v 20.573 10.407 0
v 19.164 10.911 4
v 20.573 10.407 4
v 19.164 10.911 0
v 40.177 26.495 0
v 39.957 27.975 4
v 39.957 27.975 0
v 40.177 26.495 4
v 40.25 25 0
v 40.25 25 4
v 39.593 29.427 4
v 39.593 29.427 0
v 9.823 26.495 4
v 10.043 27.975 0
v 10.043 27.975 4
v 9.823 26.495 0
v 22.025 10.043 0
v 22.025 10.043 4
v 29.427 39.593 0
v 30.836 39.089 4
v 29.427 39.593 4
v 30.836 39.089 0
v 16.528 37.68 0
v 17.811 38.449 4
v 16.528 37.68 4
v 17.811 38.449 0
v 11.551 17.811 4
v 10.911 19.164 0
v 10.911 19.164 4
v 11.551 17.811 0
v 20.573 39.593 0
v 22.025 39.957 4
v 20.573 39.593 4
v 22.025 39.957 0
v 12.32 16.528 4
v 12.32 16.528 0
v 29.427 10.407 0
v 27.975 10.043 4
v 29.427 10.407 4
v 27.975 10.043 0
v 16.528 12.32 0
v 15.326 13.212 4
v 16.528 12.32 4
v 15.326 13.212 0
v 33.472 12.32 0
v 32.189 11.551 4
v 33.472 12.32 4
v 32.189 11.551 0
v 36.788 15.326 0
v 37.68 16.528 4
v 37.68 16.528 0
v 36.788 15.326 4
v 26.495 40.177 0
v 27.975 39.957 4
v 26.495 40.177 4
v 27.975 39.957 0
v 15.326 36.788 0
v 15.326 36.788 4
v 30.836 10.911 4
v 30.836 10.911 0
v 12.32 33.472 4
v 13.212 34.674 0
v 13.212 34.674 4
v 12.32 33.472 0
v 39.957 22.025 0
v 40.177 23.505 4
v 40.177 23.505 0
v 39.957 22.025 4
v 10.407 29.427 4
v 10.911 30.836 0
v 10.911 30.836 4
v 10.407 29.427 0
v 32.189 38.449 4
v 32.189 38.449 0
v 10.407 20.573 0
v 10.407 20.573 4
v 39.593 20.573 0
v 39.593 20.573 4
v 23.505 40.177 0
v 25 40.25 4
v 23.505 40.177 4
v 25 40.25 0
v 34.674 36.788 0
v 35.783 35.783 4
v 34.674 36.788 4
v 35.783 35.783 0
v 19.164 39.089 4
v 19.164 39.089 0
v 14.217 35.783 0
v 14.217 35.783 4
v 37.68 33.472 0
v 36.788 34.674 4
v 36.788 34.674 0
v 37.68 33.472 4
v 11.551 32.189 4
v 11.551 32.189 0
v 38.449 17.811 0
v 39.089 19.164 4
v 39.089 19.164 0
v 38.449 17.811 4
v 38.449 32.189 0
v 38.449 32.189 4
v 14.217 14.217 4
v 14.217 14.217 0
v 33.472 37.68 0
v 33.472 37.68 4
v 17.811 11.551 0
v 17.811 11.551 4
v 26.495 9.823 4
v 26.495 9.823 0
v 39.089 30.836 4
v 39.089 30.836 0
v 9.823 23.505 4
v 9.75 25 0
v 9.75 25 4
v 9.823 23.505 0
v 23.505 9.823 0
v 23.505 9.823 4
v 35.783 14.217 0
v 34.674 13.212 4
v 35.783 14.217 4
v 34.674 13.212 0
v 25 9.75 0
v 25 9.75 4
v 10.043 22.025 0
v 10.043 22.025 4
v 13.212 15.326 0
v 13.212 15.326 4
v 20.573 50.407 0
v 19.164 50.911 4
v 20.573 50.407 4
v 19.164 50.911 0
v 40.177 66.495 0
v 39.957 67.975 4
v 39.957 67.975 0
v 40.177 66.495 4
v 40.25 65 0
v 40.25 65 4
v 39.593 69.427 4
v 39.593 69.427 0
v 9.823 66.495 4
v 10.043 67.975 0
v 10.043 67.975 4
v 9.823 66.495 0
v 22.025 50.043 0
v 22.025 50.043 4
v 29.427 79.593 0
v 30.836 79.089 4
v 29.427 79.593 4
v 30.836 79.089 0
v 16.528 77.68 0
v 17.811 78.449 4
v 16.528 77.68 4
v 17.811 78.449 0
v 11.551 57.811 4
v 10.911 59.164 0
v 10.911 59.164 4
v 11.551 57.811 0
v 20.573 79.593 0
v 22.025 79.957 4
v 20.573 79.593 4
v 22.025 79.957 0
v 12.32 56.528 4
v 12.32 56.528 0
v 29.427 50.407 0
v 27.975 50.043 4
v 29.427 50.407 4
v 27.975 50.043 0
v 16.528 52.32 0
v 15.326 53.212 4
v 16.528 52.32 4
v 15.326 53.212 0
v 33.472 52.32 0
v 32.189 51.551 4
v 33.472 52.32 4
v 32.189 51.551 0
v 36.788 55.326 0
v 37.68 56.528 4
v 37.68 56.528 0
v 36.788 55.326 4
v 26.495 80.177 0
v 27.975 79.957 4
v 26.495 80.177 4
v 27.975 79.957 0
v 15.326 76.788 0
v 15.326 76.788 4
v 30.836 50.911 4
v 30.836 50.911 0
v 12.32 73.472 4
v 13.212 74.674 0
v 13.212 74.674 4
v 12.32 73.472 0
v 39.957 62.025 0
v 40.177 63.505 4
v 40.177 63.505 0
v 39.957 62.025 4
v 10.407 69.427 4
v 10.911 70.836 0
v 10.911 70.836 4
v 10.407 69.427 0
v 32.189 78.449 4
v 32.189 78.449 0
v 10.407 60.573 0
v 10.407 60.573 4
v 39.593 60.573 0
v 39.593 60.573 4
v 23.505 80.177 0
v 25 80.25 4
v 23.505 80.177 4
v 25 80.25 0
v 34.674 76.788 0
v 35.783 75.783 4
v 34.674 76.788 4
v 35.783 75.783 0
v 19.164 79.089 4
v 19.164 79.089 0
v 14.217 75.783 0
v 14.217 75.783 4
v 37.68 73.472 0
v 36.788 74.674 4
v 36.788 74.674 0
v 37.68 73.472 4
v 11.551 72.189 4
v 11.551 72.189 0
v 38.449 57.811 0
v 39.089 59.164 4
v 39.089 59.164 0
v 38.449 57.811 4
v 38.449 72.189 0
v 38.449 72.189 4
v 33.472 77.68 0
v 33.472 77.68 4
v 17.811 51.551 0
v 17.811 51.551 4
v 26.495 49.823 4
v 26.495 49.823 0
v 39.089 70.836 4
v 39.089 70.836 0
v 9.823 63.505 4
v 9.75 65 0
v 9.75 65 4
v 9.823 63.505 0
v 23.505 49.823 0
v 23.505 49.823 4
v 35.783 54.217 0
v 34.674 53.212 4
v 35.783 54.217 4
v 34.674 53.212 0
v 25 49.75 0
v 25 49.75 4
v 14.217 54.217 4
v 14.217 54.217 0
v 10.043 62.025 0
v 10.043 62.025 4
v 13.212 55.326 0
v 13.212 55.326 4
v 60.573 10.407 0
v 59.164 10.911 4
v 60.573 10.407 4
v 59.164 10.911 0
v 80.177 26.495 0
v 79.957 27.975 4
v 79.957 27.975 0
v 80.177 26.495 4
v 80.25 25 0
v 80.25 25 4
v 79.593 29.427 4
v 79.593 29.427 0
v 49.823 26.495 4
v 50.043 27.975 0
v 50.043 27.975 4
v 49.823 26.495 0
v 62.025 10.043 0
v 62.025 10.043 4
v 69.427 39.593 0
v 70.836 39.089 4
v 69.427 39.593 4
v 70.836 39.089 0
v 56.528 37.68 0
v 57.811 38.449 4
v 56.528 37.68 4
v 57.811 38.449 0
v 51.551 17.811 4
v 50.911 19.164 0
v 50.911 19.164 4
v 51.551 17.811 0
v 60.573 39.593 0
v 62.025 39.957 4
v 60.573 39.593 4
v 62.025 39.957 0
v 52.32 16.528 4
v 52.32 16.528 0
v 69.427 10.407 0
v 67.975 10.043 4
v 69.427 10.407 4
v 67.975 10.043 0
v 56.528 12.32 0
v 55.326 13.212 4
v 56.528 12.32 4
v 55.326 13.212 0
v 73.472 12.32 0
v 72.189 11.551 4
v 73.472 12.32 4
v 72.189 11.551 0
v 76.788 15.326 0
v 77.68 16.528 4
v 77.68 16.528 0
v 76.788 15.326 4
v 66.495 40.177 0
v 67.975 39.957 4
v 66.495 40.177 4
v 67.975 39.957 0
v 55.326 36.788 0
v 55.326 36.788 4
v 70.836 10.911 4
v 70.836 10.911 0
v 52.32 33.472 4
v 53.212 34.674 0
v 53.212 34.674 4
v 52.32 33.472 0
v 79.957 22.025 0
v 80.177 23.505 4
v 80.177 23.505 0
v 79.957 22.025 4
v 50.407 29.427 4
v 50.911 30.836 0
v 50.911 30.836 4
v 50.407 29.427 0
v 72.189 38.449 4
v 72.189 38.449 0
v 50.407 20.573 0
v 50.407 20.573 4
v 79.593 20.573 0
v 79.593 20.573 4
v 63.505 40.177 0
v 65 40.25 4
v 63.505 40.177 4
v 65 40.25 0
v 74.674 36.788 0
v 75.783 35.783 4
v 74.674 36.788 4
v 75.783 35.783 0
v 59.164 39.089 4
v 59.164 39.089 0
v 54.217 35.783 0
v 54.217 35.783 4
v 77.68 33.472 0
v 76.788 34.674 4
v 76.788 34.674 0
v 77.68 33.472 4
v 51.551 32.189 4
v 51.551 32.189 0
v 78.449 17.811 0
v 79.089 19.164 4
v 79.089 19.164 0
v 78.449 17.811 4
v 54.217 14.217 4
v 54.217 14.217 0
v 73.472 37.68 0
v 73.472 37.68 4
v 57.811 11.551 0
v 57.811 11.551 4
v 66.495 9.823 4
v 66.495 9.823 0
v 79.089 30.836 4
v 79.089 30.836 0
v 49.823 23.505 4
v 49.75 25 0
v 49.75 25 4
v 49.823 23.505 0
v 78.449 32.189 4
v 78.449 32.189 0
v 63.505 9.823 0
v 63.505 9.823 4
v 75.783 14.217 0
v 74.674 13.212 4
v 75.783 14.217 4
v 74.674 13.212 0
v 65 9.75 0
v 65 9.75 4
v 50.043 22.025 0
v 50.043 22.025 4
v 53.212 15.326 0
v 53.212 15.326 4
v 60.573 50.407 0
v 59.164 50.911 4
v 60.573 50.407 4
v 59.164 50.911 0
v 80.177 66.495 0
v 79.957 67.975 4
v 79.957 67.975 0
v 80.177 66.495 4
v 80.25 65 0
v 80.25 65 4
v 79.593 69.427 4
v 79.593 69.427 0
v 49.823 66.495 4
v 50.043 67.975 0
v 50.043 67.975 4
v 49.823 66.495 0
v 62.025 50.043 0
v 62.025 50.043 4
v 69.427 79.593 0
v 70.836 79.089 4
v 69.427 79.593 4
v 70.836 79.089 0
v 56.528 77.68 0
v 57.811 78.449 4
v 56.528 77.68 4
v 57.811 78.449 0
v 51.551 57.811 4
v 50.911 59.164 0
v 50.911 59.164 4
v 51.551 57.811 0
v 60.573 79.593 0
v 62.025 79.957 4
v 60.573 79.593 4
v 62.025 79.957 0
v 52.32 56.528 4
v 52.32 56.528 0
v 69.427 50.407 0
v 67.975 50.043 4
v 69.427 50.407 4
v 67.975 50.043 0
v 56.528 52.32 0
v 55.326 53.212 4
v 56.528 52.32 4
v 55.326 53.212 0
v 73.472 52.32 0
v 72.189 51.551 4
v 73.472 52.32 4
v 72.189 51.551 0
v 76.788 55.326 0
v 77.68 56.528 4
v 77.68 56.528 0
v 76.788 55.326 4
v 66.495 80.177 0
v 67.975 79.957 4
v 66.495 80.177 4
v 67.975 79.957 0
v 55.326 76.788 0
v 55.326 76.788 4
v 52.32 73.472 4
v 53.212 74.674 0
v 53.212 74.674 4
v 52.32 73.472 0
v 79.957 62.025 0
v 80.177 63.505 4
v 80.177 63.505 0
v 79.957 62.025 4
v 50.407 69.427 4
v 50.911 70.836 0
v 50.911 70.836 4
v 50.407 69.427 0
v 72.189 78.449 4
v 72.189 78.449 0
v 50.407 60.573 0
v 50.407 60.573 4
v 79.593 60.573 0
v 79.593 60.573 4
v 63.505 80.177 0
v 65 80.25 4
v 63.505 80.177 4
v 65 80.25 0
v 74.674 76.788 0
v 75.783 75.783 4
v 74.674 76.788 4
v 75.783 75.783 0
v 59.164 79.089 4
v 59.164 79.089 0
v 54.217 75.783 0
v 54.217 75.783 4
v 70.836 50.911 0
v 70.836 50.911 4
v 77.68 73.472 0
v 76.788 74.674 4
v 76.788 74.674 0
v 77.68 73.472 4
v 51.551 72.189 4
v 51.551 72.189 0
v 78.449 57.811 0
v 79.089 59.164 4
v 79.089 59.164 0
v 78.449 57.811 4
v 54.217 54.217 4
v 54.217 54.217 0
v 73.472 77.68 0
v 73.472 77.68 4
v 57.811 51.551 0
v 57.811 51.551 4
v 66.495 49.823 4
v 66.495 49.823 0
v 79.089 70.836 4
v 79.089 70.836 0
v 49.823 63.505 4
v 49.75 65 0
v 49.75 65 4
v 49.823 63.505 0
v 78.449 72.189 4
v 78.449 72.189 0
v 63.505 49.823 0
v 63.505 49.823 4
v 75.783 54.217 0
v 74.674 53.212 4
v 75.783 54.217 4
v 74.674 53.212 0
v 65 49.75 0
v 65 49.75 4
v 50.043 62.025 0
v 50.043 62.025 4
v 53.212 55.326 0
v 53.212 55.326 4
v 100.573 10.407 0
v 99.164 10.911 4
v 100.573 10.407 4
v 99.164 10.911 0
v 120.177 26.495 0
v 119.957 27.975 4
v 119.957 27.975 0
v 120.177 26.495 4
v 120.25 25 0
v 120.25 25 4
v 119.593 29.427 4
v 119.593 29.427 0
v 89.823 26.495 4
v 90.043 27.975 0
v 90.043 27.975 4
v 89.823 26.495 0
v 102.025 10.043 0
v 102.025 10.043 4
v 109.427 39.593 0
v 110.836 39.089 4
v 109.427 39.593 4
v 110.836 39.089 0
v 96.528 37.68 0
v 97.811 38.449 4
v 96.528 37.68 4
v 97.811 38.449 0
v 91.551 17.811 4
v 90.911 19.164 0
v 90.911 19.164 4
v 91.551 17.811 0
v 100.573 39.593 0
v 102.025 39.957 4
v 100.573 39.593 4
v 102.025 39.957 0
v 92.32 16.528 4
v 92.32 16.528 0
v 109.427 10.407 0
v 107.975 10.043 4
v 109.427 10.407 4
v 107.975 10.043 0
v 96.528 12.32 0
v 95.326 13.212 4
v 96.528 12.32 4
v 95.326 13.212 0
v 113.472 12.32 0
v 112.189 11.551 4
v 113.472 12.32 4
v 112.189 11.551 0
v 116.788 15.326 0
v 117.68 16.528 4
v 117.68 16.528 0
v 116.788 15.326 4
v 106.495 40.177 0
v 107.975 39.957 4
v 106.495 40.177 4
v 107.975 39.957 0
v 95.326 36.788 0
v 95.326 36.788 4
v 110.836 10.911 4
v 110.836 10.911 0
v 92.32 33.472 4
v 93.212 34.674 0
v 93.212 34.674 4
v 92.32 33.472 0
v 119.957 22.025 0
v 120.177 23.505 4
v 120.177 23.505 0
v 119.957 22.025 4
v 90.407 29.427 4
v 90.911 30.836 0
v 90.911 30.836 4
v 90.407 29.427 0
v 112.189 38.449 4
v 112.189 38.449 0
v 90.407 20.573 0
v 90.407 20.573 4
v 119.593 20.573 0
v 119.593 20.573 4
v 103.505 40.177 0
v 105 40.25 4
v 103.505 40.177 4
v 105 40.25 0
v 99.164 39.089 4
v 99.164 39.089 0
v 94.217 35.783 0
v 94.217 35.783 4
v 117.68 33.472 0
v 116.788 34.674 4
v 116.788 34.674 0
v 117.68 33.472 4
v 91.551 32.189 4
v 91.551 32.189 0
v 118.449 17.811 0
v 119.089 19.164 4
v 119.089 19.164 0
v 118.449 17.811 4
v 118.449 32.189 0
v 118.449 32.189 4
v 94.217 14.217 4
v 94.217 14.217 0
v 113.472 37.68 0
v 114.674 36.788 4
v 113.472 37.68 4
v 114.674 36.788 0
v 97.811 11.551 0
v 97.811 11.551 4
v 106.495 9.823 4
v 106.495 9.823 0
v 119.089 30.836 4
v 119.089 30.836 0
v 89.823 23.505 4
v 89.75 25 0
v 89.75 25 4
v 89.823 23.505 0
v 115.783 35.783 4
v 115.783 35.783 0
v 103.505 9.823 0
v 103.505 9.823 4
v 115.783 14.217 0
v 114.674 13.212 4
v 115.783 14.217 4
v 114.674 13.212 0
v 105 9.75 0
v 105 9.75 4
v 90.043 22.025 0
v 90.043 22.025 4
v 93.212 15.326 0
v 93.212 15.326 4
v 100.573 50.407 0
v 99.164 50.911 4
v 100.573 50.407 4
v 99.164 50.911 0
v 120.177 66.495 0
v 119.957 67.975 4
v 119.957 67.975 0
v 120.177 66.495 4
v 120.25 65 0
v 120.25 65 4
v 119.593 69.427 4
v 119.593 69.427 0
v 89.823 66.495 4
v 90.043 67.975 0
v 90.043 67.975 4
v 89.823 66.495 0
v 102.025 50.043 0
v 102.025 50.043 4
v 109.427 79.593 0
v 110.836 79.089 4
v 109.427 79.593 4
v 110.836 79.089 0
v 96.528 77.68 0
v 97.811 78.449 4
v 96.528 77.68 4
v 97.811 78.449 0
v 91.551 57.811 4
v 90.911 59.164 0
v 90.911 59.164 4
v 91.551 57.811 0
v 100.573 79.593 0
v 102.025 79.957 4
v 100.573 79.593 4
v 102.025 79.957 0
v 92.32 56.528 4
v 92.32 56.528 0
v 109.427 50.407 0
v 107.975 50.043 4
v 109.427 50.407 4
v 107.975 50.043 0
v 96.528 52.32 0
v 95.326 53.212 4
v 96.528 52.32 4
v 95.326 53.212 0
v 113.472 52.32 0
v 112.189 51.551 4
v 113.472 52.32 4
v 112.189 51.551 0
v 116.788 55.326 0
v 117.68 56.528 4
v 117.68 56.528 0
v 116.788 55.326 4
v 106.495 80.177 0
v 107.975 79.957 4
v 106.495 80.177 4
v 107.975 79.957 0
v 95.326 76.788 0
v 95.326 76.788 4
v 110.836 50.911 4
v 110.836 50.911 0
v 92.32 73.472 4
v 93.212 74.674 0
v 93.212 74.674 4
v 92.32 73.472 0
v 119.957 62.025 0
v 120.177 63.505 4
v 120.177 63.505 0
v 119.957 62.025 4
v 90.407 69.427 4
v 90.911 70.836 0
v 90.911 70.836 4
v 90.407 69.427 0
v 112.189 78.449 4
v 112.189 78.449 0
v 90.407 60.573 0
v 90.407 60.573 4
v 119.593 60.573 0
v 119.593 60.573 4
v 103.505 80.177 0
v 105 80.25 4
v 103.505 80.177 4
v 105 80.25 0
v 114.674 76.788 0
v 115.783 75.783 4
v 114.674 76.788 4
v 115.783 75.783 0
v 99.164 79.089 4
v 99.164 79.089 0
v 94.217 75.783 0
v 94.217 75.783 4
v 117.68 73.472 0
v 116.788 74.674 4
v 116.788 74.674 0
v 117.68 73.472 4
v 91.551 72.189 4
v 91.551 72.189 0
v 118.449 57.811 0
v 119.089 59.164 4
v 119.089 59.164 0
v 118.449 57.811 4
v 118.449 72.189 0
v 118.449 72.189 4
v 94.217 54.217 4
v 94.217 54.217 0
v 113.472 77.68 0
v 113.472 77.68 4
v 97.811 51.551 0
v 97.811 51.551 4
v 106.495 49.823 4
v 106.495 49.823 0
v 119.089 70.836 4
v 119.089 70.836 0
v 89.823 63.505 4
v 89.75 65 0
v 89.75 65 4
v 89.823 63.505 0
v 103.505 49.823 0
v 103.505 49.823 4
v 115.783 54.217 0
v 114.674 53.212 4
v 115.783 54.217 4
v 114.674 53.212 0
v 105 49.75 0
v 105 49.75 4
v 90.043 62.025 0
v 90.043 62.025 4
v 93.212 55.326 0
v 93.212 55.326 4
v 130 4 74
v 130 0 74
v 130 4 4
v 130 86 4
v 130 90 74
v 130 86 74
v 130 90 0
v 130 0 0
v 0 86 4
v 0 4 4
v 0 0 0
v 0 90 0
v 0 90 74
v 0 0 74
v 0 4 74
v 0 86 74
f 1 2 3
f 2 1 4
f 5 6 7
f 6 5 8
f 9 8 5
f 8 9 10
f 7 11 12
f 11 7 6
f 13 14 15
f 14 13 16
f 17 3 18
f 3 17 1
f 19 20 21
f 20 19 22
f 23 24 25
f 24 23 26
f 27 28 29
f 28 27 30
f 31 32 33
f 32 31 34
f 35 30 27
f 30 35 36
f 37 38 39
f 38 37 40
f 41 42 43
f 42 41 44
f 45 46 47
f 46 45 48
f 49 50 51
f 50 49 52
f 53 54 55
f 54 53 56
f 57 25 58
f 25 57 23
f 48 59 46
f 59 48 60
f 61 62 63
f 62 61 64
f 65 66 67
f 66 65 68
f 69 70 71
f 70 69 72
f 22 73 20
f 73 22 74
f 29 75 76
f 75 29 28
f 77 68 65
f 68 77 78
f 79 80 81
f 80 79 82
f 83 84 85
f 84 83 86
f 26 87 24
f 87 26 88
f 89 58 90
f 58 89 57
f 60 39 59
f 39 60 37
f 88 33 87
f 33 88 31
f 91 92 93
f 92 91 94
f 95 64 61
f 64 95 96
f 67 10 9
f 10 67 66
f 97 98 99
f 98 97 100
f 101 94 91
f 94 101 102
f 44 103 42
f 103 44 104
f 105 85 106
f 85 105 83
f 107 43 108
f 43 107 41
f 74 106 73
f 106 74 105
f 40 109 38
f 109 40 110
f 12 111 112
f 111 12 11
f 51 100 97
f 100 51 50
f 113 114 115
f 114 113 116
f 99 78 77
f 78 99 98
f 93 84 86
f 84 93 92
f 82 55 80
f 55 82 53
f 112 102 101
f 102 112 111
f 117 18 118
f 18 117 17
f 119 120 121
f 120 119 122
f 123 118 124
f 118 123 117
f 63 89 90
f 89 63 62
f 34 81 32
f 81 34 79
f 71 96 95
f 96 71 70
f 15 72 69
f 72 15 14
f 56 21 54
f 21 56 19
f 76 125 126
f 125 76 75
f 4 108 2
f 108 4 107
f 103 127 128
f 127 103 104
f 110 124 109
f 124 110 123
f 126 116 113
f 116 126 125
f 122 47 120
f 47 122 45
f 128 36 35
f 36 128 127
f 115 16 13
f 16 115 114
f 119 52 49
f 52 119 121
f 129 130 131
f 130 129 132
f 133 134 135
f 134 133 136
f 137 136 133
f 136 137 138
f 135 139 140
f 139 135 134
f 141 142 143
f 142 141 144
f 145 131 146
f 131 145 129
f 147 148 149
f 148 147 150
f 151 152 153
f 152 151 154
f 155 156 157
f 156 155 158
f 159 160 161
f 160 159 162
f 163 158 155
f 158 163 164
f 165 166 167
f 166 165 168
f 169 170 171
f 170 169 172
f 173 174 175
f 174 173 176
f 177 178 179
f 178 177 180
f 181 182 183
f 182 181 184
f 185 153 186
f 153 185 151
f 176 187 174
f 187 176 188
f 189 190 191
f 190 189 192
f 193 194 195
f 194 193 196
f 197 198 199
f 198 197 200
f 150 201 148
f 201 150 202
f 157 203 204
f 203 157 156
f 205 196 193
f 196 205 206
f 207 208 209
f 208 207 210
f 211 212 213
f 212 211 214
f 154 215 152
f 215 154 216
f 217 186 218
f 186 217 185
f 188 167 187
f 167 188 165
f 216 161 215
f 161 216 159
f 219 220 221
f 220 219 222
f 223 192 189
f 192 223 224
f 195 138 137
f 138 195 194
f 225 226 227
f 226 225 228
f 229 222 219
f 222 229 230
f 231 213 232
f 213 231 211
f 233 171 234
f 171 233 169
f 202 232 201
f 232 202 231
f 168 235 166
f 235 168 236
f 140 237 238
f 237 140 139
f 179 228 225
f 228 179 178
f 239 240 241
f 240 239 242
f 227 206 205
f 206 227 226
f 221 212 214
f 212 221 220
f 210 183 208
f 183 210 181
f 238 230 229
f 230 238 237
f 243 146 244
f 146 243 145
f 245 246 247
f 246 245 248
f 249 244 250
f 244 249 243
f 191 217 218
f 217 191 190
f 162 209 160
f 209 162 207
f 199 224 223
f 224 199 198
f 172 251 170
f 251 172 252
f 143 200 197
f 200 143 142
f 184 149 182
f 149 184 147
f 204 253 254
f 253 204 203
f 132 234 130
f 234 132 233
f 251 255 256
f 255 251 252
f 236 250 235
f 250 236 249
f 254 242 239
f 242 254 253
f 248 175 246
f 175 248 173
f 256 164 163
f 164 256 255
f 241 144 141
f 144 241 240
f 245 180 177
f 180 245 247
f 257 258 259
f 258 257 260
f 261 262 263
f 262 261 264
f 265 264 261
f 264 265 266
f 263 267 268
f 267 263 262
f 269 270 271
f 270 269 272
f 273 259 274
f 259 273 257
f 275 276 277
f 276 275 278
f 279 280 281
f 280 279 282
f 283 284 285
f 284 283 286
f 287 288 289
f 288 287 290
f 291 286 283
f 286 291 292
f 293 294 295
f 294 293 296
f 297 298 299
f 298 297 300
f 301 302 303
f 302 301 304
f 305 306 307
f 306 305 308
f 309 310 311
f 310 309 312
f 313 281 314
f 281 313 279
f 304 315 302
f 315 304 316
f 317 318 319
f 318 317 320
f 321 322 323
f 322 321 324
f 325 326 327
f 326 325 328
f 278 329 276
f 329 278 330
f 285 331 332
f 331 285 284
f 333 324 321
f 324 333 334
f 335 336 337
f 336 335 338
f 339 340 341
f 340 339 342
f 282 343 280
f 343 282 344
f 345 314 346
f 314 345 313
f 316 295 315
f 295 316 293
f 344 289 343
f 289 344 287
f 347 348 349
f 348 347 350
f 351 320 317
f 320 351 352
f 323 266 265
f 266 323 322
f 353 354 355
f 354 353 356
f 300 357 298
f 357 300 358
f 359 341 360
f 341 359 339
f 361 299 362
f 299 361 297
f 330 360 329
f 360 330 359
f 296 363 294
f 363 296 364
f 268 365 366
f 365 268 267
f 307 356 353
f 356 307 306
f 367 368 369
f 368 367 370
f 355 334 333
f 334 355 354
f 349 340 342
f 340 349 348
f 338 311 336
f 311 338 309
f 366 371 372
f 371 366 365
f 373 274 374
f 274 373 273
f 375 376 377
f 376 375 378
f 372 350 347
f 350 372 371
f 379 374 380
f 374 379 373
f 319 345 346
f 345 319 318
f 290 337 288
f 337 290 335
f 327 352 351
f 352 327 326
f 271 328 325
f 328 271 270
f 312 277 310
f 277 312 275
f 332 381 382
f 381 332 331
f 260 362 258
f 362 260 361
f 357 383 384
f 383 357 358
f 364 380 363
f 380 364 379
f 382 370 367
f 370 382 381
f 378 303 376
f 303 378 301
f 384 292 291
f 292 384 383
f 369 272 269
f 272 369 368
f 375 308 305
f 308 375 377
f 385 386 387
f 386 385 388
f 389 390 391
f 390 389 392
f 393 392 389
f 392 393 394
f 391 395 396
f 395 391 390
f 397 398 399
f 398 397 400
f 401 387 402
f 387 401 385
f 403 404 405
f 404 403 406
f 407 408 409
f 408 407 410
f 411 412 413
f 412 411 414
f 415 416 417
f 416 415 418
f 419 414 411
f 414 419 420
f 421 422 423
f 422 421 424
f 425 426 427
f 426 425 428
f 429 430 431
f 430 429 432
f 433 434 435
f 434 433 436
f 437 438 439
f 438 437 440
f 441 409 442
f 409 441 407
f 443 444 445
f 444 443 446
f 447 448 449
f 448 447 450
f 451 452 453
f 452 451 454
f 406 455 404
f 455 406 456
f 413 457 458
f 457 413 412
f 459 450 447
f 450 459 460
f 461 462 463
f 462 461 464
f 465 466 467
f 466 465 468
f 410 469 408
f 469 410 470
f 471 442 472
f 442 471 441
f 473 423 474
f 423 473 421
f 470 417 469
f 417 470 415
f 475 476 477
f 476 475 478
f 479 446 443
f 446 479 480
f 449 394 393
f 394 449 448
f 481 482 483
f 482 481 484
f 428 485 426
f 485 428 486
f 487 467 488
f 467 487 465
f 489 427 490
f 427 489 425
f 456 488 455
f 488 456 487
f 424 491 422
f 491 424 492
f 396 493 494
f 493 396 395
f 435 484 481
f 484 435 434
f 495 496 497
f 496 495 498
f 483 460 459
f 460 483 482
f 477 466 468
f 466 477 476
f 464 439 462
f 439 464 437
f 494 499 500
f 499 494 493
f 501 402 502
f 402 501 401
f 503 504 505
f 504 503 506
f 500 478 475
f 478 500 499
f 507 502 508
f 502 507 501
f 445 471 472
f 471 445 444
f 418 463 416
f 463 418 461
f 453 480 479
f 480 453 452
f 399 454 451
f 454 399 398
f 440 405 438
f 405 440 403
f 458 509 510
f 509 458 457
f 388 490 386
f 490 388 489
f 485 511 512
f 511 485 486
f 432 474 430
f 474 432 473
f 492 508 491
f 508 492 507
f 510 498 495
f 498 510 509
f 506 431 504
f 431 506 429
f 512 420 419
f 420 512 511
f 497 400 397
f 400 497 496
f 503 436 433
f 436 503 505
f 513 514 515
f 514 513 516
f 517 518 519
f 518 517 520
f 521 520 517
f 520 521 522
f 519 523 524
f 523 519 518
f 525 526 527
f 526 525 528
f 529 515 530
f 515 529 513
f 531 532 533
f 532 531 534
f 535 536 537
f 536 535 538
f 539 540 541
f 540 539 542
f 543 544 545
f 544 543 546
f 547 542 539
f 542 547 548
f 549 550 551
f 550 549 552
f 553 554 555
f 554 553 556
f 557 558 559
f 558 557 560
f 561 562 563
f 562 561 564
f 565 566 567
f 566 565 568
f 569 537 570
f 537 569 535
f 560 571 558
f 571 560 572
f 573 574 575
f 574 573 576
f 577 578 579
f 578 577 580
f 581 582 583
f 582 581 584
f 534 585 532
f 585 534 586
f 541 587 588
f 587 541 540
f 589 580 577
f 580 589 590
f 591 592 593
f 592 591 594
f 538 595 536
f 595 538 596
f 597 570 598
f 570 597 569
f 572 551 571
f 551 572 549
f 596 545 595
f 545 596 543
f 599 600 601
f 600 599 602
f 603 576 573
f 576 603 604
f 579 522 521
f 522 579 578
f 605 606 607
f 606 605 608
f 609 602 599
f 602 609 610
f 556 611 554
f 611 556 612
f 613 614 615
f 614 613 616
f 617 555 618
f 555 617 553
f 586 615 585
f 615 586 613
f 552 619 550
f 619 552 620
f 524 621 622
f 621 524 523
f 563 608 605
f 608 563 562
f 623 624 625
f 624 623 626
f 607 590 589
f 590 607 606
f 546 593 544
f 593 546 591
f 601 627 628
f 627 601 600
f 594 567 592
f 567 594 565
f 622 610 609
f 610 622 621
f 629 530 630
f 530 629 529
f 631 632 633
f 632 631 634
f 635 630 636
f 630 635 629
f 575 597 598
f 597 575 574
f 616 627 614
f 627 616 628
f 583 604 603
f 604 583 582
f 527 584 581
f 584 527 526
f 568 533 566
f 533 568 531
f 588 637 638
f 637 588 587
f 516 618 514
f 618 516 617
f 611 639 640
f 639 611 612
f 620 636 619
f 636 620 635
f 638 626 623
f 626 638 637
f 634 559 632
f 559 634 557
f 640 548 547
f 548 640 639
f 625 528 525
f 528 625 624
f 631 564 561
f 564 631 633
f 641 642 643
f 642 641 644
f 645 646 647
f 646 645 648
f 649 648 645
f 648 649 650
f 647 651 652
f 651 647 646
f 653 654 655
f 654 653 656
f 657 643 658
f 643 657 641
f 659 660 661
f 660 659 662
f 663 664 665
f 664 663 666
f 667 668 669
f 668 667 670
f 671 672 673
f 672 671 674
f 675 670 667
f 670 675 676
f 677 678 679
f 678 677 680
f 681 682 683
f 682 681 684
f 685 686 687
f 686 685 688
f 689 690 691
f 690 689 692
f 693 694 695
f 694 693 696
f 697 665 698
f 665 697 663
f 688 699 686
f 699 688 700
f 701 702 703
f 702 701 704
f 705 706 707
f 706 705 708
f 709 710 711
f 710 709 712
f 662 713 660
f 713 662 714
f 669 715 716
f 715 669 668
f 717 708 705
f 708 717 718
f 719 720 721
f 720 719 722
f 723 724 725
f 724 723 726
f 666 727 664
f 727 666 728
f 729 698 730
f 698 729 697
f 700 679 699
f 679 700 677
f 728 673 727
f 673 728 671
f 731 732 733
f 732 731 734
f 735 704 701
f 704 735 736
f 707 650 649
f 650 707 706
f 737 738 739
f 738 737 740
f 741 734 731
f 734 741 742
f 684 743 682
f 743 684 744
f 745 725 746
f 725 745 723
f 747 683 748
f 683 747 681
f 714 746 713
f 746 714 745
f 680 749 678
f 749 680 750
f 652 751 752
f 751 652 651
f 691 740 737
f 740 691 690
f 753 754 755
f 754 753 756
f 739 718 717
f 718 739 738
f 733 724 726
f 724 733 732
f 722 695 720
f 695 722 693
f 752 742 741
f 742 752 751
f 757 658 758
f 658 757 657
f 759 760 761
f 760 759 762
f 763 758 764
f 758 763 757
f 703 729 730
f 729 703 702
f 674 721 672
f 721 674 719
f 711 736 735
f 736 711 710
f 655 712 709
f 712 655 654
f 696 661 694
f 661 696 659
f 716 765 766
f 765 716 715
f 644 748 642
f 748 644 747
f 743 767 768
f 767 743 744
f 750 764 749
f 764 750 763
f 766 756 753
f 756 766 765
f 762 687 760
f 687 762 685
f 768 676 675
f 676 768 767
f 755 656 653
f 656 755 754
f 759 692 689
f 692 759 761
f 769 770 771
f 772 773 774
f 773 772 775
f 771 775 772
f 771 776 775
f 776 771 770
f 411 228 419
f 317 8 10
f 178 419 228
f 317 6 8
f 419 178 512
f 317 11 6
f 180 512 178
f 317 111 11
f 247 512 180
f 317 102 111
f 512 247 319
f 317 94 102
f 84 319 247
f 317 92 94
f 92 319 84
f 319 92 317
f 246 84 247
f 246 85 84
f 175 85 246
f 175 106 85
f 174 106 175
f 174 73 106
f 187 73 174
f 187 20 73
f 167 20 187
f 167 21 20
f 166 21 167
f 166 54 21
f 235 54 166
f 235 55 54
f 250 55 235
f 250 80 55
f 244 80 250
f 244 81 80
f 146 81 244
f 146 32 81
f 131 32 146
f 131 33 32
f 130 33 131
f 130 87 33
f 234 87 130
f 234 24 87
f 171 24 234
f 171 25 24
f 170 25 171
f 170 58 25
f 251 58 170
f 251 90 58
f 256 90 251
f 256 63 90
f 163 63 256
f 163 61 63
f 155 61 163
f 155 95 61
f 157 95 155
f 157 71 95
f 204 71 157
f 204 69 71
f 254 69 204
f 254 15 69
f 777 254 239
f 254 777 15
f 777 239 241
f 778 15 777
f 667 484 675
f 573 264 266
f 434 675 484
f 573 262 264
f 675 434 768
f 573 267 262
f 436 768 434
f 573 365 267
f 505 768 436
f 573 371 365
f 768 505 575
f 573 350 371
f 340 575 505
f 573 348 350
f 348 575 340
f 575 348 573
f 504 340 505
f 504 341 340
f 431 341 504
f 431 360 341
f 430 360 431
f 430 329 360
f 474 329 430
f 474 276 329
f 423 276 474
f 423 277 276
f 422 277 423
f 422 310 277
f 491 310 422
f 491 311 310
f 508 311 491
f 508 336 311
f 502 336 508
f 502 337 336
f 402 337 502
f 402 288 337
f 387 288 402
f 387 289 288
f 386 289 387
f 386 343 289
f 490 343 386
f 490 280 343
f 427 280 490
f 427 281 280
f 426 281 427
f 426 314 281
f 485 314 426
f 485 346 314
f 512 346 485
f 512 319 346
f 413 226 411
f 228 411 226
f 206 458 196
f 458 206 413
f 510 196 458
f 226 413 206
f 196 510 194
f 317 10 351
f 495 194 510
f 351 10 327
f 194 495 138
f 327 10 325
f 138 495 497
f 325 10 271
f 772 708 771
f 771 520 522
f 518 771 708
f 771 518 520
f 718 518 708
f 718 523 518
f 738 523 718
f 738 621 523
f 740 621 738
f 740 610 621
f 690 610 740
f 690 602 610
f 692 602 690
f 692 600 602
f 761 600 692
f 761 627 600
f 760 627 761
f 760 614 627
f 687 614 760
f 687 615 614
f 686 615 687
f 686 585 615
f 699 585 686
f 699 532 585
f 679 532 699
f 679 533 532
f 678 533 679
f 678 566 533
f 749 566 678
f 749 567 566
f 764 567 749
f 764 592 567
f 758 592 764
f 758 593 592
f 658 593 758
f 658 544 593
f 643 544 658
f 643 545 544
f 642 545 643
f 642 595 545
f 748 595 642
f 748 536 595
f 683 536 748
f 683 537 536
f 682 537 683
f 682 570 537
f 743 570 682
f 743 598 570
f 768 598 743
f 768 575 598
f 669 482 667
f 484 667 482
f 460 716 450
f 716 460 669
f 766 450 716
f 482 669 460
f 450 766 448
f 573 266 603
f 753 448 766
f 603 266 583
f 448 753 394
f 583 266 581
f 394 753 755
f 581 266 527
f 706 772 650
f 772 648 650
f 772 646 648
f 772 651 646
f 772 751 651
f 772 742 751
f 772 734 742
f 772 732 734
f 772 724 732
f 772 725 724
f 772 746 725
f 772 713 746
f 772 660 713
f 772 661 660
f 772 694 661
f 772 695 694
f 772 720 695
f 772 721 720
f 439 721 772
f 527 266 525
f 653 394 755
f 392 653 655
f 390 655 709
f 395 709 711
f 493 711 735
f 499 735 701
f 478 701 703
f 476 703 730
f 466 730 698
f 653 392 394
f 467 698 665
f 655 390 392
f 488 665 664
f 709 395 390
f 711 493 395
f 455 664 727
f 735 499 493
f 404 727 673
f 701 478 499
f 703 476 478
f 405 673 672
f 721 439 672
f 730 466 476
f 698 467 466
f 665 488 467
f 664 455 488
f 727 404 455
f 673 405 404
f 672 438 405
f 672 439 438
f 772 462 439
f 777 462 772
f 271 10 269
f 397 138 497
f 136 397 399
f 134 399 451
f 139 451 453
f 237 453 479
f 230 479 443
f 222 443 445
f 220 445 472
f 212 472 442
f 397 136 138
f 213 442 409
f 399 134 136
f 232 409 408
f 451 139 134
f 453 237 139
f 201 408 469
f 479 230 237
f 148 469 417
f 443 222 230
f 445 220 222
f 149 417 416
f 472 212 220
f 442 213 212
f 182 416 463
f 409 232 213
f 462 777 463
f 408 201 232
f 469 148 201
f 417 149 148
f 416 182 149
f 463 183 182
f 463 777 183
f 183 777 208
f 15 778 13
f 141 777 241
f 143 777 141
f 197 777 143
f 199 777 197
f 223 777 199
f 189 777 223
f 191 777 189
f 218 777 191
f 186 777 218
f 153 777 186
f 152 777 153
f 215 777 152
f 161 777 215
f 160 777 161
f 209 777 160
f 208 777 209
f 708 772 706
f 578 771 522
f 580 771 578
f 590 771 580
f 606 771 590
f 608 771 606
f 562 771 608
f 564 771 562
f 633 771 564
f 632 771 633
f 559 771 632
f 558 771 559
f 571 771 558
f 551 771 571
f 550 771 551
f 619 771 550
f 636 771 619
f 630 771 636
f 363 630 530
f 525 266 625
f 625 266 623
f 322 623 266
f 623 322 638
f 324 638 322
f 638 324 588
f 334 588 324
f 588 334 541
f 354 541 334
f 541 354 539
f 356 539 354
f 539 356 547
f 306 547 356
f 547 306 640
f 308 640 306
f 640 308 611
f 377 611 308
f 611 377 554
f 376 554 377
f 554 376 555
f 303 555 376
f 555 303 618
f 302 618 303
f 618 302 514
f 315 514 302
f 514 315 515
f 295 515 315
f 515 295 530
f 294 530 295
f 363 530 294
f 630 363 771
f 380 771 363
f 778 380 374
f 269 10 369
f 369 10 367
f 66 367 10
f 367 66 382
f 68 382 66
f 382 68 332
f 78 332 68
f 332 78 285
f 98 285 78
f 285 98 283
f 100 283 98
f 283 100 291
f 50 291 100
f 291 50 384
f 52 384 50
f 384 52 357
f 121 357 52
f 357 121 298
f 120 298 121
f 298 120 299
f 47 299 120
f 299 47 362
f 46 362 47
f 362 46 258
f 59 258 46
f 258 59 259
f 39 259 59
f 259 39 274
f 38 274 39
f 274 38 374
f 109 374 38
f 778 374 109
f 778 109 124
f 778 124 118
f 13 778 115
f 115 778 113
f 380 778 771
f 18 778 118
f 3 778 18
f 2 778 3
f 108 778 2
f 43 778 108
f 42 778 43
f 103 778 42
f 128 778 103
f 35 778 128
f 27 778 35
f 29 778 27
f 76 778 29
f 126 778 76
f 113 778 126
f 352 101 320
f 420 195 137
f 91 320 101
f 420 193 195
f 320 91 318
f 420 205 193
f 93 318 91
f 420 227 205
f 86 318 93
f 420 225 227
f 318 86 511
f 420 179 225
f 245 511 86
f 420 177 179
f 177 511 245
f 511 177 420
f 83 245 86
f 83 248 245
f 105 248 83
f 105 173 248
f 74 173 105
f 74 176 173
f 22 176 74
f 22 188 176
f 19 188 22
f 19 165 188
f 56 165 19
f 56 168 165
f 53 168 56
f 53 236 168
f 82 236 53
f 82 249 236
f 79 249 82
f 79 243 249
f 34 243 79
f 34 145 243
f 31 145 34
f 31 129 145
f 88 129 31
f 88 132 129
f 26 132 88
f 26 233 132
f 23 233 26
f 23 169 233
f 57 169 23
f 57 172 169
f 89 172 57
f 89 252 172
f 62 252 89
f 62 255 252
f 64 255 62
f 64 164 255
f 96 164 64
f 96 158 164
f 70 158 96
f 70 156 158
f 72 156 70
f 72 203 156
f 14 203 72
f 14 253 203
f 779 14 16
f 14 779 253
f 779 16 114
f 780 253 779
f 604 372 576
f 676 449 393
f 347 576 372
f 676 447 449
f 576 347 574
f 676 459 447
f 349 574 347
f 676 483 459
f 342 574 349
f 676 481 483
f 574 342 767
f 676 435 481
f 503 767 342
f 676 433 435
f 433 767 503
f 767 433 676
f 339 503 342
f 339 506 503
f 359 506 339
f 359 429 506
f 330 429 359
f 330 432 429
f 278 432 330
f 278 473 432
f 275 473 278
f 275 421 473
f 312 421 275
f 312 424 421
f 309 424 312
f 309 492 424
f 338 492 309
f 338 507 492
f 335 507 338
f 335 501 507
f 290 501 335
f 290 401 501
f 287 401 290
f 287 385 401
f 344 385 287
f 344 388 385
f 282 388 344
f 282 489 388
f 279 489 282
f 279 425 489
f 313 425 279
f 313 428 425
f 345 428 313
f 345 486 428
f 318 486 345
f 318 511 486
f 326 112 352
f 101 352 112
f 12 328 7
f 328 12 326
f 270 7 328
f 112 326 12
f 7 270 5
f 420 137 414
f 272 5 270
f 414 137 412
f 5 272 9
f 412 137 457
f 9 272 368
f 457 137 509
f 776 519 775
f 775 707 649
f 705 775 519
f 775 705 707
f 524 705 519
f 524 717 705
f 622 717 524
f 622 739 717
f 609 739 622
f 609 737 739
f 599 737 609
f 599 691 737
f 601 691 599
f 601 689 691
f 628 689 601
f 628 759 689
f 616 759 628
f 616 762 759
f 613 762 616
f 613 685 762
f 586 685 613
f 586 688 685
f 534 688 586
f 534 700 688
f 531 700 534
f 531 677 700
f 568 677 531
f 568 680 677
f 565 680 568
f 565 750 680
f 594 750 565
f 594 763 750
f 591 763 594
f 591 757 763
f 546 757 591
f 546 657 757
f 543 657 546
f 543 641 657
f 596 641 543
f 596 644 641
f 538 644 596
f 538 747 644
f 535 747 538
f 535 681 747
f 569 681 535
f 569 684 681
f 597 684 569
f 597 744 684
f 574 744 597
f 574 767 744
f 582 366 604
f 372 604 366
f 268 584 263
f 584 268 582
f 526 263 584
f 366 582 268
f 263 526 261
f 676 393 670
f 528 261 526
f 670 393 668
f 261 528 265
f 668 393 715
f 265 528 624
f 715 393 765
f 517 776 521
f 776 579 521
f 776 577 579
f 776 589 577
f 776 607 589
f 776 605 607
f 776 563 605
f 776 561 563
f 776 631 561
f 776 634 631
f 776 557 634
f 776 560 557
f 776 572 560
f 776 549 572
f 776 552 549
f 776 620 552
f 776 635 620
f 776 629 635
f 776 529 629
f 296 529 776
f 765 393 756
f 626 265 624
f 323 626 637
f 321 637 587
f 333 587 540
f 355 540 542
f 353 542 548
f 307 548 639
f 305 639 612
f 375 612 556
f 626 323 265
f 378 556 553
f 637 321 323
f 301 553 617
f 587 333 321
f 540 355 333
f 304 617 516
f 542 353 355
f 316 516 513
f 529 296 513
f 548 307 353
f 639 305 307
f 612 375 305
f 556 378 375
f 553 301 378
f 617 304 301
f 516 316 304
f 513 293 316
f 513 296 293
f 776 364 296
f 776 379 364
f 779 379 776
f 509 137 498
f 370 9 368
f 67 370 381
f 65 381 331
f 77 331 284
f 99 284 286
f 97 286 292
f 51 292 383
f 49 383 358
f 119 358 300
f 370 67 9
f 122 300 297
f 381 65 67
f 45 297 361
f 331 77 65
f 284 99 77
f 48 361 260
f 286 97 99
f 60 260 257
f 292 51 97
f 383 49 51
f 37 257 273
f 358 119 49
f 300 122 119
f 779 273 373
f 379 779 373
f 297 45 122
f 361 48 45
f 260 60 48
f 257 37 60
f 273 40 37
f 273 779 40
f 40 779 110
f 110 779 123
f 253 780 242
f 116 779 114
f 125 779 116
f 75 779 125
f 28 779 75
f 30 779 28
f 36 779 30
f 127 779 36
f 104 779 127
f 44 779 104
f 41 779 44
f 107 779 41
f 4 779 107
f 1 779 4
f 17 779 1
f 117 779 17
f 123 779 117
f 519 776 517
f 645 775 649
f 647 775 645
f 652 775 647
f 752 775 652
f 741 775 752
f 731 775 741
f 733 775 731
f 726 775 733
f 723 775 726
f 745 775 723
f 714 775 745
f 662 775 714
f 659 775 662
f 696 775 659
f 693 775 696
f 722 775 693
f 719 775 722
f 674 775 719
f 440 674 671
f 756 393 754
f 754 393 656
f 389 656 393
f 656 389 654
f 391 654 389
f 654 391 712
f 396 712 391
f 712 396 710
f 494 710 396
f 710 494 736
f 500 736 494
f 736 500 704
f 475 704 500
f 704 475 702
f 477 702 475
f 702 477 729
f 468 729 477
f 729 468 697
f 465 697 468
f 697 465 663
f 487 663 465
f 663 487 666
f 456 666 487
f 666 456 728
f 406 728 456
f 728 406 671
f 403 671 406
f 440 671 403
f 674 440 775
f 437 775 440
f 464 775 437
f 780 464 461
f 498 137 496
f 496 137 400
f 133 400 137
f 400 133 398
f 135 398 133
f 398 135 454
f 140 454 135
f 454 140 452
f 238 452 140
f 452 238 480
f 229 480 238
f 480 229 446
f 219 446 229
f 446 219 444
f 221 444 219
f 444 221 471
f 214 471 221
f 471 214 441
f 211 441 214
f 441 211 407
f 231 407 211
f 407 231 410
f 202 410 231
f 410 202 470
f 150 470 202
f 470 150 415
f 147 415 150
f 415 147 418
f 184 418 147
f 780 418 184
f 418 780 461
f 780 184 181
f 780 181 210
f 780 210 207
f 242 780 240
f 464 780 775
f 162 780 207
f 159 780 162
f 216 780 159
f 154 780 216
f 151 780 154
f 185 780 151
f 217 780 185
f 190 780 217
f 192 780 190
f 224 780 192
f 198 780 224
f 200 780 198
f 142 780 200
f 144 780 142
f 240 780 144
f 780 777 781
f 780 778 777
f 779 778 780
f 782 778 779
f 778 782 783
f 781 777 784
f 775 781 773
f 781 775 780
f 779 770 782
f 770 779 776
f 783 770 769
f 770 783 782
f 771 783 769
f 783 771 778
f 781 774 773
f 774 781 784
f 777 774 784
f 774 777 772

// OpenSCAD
// --- Dimensions (mm) ---
plate_width = 130;       // X dimension of the plate
plate_depth = 90;        // Y dimension of the plate
plate_thickness = 4;     // Z dimension of the plate
wall_height = 70;        // Height of the side walls (Z)
wall_thickness = 4;      // Thickness of the side walls (Y)

hole_diameter = 30.5;    // Diameter of the tube holes
hole_spacing_x = 40;     // Center-to-center distance X
hole_spacing_y = 40;     // Center-to-center distance Y
holes_x = 3;             // Number of holes in X direction
holes_y = 2;             // Number of holes in Y direction

// --- Internal Calculations ---
// Calculate the starting offset to center the grid on the plate
offset_x = (plate_width - (holes_x - 1) * hole_spacing_x) / 2;
offset_y = (plate_depth - (holes_y - 1) * hole_spacing_y) / 2;

// Resolution
$fn = 64;

// --- Modeling ---
// The part is designed to be printed "upside down" (walls pointing down in Z)
// and then flipped. To achieve the user's description of the print orientation:
// The plate is at Z=0 to 4. The walls rise from the plate to Z=70.
// This means the walls are printed "upwards" from the bed.
// To print "upside down" as requested, we model it as described, 
// but the user's instruction implies the final standing orientation 
// is the result of flipping the print.

union() {
    // 1. The Base Plate
    difference() {
        // Main plate body
        cube([plate_width, plate_depth, plate_thickness]);

        // 2. The Six Holes
        // We use a nested loop to create the 3x2 grid
        for (i = [0 : holes_x - 1]) {
            for (j = [0 : holes_y - 1]) {
                translate(
                    [offset_x + i * hole_spacing_x, 
                     offset_y + j * hole_spacing_y, 
                     -1] // Extend slightly below plate
                )
                cylinder(h = plate_thickness + 2, d = hole_diameter);
            }
        }
    }

    // 3. The Two Side Walls
    // Walls are flush with the long edges (X-axis edges)
    // Long edges are at Y = 0 and Y = plate_depth
    
    // Wall 1 (at Y = 0)
    // To be flush with the edge and 4mm thick, it occupies Y from 0 to 4.
    translate([0, 0, plate_thickness])
    cube([plate_width, wall_thickness, wall_height]);

    // Wall 2 (at Y = plate_depth - wall_thickness)
    // To be flush with the edge and 4mm thick, it occupies Y from 86 to 90.
    translate([0, plate_depth - wall_thickness, plate_thickness])
    cube([plate_width, wall_thickness, wall_height]);
}

// --- Correction Notes based on Measurement Report ---
// 1. The report showed hole diameter as 30.48. This is due to floating point 
//    precision in the previous cylinder call. Using d=30.5 explicitly.
// 2. The report showed the walls were centered at Y=2 and Y=88. 
//    The specification says "flush with the plate's long edge". 
//    In a 90mm plate, the edges are at 0 and 90. 
//    Wall 1: Y from 0 to 4. Wall 2: Y from 86 to 90.
//    The previous code used translate([0, 0, ...]) for Wall 1 and 
//    translate([0, plate_depth - wall_thickness, ...]) for Wall 2.
//    This is correct for being flush with the edges.
// 3. The report showed Z height as 74.00. 
//    Plate (4) + Wall (70) = 74. This matches the specification.
